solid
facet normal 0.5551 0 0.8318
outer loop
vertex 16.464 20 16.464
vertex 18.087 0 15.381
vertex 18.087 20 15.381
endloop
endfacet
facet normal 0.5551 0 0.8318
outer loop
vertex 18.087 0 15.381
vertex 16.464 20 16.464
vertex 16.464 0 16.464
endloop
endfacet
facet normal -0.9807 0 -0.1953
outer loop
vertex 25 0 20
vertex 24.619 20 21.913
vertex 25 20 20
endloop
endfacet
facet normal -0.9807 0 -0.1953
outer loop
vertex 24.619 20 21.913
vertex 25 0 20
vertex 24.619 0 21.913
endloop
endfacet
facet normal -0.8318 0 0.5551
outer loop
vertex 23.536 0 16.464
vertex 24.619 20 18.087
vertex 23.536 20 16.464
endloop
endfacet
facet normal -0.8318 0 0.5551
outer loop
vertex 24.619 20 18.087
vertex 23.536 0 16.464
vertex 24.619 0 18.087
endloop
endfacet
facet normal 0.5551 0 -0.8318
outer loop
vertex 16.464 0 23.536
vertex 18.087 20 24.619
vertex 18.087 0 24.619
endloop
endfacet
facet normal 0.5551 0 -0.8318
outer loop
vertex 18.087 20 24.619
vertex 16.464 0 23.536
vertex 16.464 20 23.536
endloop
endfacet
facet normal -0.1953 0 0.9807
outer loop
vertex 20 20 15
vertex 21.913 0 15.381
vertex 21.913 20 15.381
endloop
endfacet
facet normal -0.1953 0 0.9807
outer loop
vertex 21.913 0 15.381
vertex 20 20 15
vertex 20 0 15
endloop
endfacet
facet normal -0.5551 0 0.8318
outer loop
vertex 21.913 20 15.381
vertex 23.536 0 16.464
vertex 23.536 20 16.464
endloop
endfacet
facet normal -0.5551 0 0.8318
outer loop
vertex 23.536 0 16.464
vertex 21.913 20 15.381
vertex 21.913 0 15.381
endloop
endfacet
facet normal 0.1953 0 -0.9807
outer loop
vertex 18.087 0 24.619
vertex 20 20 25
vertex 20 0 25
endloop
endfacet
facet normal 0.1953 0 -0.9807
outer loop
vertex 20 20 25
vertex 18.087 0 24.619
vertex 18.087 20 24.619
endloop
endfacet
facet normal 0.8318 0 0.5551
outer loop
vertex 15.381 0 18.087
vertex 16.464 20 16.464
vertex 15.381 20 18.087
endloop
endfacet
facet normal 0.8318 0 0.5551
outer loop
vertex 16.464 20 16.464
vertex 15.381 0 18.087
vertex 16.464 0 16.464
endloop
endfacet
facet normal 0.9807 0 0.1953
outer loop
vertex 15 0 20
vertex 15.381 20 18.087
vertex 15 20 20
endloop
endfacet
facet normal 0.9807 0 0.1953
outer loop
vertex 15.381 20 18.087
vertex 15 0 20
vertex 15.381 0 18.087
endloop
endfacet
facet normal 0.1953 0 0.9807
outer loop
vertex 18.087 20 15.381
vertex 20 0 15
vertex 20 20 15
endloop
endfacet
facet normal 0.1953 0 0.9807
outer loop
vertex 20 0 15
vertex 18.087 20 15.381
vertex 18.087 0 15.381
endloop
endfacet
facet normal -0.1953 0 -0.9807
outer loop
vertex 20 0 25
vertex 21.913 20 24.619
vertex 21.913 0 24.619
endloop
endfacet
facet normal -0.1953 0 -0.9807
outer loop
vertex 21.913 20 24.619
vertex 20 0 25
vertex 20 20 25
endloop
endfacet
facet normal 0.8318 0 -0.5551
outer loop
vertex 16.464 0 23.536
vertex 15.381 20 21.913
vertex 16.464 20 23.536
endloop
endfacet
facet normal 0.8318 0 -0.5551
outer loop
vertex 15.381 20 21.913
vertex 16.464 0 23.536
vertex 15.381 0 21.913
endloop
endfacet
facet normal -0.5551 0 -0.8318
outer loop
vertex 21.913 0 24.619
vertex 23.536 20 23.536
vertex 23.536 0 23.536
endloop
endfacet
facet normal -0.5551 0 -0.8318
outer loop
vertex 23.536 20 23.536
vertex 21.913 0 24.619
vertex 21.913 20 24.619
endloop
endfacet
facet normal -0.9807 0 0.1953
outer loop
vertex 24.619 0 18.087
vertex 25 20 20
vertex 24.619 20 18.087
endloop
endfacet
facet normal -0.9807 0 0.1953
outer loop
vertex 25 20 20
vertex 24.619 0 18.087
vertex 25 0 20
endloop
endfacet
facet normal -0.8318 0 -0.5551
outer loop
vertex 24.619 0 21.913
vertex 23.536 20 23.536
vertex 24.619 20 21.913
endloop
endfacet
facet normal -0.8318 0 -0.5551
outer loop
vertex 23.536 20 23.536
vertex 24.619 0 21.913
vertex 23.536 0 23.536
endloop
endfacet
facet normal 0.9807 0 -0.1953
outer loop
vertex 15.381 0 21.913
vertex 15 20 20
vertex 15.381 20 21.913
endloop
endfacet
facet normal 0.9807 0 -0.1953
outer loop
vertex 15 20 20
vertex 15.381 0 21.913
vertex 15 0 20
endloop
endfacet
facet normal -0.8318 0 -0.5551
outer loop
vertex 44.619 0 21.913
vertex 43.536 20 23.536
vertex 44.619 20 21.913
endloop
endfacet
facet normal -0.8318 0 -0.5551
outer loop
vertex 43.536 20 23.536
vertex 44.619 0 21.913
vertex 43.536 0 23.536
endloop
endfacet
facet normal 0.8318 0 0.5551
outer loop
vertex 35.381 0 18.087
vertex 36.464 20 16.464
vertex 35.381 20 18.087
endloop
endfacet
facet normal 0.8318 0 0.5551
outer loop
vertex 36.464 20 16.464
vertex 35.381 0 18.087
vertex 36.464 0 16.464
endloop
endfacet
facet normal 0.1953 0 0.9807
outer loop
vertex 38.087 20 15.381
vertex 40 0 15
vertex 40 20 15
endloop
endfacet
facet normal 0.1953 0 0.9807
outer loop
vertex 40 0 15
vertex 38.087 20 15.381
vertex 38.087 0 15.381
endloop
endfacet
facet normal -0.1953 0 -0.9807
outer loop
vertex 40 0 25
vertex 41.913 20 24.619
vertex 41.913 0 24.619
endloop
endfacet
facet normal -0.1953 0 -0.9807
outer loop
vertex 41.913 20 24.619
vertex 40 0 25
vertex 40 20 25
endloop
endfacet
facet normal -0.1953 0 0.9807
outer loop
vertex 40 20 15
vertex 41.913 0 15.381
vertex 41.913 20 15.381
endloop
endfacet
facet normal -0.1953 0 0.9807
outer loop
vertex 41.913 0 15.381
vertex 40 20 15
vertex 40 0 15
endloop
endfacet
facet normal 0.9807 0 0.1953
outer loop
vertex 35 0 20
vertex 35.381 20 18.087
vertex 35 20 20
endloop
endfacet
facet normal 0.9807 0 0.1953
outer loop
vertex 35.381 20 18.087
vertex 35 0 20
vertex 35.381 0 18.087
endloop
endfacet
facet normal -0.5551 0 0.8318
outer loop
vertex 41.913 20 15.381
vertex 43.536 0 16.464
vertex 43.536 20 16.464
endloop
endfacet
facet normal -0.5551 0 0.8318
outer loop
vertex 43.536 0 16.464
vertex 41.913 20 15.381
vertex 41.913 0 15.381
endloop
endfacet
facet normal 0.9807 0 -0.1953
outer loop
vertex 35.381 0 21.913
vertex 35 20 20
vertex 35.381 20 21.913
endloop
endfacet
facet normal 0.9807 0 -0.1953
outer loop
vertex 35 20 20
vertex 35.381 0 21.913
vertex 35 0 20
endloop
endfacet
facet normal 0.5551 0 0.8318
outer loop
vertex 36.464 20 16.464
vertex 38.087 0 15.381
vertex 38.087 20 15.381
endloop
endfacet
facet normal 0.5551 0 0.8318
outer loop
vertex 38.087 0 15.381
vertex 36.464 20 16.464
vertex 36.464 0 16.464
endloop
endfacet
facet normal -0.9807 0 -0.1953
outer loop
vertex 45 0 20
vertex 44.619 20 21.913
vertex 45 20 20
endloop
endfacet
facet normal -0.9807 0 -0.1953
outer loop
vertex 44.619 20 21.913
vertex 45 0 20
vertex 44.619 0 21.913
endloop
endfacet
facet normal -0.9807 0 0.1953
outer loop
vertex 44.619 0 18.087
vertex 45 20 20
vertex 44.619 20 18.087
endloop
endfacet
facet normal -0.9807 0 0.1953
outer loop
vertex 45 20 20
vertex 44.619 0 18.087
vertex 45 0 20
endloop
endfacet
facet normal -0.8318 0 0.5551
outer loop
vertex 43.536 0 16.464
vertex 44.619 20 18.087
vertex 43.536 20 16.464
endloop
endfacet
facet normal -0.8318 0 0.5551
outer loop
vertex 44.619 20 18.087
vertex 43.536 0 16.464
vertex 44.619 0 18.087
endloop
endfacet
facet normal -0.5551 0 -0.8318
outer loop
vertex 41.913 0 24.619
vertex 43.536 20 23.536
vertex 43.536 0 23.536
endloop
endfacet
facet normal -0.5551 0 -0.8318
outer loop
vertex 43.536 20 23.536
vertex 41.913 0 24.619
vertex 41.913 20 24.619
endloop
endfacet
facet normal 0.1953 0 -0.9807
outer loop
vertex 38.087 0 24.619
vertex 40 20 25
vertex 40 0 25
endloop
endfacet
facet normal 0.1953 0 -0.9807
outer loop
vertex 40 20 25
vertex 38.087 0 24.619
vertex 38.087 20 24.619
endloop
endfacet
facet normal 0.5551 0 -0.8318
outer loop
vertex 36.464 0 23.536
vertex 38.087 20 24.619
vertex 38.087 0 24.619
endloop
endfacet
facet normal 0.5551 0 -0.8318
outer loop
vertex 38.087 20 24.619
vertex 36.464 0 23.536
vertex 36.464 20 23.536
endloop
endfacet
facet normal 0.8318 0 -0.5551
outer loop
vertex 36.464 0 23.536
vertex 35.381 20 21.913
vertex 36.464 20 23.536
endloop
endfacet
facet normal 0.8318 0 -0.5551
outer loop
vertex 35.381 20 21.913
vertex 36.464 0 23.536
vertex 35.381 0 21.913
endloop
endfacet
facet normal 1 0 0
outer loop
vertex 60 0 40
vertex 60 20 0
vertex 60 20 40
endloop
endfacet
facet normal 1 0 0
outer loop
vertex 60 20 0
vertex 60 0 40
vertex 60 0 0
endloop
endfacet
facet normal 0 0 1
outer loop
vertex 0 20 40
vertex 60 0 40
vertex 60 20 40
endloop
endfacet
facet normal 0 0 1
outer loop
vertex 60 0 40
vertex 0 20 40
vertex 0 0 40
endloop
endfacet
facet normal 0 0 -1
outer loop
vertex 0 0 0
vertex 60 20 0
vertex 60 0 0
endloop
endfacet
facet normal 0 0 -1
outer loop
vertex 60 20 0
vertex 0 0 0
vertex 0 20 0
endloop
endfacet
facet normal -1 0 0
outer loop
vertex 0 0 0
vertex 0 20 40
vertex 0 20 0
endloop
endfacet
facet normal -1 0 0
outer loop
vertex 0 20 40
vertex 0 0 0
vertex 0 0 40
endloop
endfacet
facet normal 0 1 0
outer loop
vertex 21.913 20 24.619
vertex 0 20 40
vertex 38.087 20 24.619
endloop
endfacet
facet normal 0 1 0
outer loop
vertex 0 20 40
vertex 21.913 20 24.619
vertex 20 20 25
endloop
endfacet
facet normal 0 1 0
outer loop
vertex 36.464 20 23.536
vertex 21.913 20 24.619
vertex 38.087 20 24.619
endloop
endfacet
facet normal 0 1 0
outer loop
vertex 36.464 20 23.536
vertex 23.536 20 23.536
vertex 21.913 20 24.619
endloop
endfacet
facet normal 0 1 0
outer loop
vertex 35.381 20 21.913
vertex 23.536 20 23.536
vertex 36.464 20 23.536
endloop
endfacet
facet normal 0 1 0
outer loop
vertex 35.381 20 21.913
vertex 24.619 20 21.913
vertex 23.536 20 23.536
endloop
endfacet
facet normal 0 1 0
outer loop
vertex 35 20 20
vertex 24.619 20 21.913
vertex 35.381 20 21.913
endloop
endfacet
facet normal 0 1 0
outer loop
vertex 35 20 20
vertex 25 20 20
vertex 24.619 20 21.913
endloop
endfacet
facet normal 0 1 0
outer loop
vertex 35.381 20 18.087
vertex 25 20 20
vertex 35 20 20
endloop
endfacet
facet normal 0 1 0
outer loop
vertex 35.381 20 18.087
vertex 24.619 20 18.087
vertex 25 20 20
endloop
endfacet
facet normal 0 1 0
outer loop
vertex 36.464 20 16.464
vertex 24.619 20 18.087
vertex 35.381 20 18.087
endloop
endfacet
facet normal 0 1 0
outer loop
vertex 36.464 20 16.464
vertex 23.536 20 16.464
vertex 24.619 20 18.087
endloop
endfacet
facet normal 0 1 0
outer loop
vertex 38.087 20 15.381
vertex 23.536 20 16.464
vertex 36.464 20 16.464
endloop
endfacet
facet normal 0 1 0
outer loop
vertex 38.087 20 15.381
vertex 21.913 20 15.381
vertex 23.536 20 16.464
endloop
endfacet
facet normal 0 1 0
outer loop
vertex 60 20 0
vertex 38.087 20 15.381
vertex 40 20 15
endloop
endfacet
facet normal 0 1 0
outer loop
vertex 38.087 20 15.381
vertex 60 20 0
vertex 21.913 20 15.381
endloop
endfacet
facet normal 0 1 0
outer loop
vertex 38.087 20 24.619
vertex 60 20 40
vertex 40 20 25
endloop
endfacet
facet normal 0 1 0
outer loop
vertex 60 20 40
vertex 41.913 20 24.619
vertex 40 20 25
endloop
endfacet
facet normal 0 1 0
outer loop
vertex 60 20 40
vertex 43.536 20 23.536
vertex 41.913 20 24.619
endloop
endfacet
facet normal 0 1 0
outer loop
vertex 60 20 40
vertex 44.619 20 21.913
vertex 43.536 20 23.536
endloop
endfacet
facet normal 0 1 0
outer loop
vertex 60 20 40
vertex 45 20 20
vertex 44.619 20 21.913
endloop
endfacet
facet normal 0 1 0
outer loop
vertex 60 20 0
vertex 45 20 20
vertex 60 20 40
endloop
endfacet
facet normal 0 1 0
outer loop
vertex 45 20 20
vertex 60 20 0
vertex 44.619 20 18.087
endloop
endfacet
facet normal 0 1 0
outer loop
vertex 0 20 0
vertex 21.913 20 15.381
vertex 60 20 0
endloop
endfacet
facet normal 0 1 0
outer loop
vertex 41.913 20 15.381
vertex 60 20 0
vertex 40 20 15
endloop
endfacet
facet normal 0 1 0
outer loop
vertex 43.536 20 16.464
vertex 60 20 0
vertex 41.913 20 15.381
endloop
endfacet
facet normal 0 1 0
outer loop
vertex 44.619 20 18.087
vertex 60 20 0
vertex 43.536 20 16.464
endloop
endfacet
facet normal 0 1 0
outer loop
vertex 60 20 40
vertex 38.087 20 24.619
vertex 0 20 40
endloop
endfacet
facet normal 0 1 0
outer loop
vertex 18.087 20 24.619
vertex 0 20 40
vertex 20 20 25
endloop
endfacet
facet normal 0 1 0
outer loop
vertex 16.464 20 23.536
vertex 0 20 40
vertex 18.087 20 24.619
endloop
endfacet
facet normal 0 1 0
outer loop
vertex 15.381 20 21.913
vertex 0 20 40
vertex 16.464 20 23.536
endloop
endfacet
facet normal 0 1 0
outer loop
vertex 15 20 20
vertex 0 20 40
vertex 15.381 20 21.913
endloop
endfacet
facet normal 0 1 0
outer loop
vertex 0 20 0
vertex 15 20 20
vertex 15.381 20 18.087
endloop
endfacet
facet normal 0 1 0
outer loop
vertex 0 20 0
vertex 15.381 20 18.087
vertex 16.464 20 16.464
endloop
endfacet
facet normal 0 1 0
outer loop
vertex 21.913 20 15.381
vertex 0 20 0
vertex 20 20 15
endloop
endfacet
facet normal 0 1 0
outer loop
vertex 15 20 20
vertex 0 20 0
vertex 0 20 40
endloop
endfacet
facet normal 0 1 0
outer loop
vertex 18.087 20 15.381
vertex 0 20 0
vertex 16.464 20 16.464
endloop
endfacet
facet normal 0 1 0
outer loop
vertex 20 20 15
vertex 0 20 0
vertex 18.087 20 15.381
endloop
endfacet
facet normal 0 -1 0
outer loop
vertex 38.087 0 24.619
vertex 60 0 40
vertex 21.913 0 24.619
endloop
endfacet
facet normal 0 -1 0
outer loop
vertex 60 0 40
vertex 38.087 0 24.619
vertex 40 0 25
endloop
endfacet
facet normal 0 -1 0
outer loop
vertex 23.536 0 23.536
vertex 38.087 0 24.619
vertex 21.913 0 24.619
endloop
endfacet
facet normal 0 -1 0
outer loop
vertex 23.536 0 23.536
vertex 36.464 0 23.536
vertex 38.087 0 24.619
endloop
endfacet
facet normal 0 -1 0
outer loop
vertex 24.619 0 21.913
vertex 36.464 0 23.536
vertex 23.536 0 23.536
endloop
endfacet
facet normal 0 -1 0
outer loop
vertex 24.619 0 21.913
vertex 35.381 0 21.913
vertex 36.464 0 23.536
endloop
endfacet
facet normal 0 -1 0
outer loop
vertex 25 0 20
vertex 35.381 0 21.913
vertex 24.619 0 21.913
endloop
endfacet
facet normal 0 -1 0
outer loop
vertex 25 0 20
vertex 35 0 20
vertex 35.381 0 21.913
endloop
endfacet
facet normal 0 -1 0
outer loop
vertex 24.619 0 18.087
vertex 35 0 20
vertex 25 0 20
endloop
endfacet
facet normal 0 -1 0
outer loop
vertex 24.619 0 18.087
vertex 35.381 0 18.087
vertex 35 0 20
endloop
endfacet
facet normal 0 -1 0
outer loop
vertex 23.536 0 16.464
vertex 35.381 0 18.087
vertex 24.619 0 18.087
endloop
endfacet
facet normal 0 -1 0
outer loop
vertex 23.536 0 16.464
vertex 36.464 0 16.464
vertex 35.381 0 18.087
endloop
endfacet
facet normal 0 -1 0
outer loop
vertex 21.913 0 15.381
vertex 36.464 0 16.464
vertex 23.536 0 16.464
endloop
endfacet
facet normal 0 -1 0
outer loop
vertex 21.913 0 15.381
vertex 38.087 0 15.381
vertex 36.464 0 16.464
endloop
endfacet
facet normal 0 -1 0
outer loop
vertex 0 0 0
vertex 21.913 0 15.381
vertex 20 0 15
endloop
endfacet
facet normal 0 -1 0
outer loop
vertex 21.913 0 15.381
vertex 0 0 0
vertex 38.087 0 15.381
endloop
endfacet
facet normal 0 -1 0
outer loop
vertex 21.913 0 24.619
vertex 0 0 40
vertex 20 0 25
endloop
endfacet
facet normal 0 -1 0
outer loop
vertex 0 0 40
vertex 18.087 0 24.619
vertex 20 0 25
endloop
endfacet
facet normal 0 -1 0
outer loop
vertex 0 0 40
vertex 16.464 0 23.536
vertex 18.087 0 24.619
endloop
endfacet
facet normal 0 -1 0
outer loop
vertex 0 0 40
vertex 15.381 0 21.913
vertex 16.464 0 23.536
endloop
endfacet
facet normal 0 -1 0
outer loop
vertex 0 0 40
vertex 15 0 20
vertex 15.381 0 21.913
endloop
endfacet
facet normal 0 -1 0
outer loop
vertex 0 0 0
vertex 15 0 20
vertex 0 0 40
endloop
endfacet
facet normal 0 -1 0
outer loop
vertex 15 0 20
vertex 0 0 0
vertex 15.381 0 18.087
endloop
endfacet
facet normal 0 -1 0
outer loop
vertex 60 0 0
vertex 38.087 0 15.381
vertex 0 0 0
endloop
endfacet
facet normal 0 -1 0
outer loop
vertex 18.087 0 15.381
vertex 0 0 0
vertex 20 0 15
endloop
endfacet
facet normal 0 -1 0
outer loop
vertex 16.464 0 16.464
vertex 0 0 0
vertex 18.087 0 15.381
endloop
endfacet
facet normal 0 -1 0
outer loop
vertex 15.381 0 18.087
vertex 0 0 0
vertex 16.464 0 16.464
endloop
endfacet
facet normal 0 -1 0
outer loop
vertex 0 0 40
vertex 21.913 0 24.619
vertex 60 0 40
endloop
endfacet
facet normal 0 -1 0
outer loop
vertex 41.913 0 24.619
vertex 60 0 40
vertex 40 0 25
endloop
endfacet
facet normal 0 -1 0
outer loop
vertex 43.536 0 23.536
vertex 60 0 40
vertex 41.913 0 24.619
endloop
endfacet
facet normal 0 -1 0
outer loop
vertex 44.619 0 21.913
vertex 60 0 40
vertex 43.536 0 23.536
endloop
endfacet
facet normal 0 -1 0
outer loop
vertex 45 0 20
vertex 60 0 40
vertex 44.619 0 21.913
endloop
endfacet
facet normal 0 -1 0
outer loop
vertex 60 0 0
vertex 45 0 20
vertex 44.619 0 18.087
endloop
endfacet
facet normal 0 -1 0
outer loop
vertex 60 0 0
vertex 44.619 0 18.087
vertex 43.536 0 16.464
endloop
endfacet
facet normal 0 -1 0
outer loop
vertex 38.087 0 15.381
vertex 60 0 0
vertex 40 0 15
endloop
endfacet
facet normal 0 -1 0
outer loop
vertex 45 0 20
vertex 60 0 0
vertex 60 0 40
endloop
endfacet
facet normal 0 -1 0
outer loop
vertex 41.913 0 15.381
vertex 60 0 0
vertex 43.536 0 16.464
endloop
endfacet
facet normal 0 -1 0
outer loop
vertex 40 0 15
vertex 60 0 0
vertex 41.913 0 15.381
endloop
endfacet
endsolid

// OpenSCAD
difference(){
	cube(size = [60,20,40]);

	union(){
		translate(v=[20,21,20]){
			rotate(a = [90,90,0] ){
				cylinder(22,5,5);
			}
		}
		translate(v=[40,21,20]){
			rotate(a = [90,90,0] ){
				cylinder(22,5,5);
			}
		}
	}
}
